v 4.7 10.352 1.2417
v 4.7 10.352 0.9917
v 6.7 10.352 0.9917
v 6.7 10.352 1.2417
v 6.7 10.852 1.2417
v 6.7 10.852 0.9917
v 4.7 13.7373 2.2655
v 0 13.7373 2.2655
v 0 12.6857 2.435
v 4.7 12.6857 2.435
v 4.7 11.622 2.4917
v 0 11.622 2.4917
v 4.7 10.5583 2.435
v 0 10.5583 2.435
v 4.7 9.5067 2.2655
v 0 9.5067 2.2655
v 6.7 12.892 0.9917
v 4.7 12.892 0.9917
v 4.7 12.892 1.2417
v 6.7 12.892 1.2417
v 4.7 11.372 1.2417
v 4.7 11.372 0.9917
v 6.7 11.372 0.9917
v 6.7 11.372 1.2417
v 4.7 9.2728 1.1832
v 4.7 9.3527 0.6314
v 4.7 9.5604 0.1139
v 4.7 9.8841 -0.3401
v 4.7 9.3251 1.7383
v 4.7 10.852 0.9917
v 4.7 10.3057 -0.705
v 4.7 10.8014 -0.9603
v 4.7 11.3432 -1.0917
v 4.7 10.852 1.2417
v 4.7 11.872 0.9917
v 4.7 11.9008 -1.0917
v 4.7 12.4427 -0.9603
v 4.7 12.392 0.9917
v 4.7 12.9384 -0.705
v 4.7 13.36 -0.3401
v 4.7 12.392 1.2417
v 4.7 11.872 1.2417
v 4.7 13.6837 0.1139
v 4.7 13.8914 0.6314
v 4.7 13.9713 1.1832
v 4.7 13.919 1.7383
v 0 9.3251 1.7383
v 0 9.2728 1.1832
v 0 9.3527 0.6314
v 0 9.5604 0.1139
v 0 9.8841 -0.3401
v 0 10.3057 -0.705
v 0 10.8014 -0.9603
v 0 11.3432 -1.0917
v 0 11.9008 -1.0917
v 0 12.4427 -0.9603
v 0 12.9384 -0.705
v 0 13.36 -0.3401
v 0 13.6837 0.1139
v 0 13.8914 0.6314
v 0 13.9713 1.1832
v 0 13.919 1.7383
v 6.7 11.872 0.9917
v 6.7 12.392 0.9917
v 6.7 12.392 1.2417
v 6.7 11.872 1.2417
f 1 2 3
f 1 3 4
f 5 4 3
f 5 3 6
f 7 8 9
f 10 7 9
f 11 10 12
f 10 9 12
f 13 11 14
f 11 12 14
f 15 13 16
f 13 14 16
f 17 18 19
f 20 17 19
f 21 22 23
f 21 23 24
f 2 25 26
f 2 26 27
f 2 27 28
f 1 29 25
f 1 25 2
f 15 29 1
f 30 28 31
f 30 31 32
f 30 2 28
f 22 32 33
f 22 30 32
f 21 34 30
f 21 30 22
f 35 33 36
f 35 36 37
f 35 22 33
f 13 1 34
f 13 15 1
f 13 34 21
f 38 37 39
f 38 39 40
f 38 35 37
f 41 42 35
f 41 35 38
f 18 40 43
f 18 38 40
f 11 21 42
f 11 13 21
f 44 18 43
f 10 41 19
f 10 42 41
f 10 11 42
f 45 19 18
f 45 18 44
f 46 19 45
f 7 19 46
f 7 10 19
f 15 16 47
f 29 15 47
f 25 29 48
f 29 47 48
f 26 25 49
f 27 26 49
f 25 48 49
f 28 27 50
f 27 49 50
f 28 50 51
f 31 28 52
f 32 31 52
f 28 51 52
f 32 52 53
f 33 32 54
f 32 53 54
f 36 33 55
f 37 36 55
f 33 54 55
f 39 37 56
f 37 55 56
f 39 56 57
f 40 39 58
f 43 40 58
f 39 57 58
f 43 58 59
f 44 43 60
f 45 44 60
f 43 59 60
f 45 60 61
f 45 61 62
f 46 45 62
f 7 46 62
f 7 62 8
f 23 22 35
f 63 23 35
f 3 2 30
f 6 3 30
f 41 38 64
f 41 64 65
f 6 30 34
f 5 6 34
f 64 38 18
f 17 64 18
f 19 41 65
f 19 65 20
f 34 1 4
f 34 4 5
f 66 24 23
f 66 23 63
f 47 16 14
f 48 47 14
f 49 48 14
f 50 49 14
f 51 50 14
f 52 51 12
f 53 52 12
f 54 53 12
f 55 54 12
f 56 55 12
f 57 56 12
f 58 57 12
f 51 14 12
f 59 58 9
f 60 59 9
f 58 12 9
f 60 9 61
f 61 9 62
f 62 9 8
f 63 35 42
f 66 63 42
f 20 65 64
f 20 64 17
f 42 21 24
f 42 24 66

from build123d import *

# Parameters (mm, degrees)
F1_DEPTH = 4.7
F2_W     = 0.5
F2_H     = 0.25
F3_DEPTH = 2


with BuildPart() as f1:
    # F0 (on Right) → F1 (new body)
    with BuildSketch(Plane.YZ):
        with BuildLine():
            ThreePointArc((13.7373347581, 2.2654625069), (11.6220312193, 2.4917482212), (9.5067276805, 2.2654625069))
            ThreePointArc((9.5067276805, 2.2654625069), (11.6220312193, -1.1082517788), (13.7373347581, 2.2654625069))
        make_face()
    extrude(amount=F1_DEPTH)

    # F2 (on face) → F3 (join)
    with BuildSketch(Plane.YZ.offset(4.7)):
        with Locations((10.6020312193, 1.1167482212)):
            Rectangle(F2_W, F2_H)
        with Locations((11.6220312193, 1.1167482212)):
            Rectangle(F2_W, F2_H)
        with Locations((12.6420312193, 1.1167482212)):
            Rectangle(F2_W, F2_H)
    extrude(amount=F3_DEPTH)


solid = f1.part
